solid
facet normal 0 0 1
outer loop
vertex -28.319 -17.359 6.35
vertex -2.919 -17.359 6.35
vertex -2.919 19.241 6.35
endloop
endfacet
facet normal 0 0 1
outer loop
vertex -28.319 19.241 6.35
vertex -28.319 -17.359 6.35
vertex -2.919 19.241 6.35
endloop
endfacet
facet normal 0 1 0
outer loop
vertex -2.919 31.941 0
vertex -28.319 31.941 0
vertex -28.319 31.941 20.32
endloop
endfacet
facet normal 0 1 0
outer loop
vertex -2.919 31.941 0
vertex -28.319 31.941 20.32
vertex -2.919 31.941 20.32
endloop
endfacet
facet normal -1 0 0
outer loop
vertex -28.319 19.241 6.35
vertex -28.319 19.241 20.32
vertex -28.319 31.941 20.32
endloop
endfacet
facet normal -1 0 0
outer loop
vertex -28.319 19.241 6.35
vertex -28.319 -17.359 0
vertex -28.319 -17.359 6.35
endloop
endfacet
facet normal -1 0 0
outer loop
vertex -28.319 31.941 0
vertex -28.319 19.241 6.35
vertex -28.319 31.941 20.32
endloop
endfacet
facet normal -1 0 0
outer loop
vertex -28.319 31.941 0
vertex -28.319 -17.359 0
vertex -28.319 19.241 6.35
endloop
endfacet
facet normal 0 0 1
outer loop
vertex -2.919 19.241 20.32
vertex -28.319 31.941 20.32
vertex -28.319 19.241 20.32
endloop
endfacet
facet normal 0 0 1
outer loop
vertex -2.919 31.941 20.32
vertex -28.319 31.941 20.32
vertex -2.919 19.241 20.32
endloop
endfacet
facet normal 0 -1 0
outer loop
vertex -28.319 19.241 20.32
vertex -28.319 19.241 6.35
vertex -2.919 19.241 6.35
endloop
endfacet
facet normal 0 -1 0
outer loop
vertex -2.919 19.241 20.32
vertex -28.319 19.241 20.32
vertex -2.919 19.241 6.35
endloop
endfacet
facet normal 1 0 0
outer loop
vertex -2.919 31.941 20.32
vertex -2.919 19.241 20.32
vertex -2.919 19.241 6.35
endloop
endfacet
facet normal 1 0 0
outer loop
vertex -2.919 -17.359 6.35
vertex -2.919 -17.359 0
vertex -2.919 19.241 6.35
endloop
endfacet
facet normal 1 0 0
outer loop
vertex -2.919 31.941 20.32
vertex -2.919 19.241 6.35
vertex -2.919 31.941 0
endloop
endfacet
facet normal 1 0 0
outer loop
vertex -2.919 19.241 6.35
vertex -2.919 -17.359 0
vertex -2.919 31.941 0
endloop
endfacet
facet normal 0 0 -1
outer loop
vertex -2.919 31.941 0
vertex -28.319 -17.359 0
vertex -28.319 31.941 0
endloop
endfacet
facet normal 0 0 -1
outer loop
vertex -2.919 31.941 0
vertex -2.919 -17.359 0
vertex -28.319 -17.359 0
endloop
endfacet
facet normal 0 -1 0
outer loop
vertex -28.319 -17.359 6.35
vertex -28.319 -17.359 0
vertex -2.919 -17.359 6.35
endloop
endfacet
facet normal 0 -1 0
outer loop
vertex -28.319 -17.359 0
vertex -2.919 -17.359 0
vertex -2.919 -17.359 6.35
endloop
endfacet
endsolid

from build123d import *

# Parameters (mm, degrees)
SKETCH1_W           = 12.7
SKETCH1_H           = 49.300000012
BOSS_EXTRUDE1_DEPTH = 6.35
SKETCH3_W           = 6.35
SKETCH3_H           = 49.300000012
BOSS_EXTRUDE3_DEPTH = 12.7
SKETCH2_W           = 25.4
SKETCH2_H           = 12.7
BOSS_EXTRUDE2_DEPTH = 13.97


with BuildPart() as part:
    # Sketch1 → Boss-Extrude1 (new body)
    with BuildSketch(Plane.XY):
        with Locations((-9.26915446, 7.290553641)):
            Rectangle(SKETCH1_W, SKETCH1_H)
    extrude(amount=BOSS_EXTRUDE1_DEPTH)

    # Sketch3 → Boss-Extrude3 (add)
    with BuildSketch(Plane.ZY.offset(15.61915446)):
        with Locations((3.175, 7.290553641)):
            Rectangle(SKETCH3_W, SKETCH3_H)
    extrude(amount=BOSS_EXTRUDE3_DEPTH)

    # Sketch2 → Boss-Extrude2 (add)
    with BuildSketch(Plane.XY.offset(6.35)):
        with Locations((-15.61915446, 25.590553647)):
            Rectangle(SKETCH2_W, SKETCH2_H)
    extrude(amount=BOSS_EXTRUDE2_DEPTH)


solid = part.part
